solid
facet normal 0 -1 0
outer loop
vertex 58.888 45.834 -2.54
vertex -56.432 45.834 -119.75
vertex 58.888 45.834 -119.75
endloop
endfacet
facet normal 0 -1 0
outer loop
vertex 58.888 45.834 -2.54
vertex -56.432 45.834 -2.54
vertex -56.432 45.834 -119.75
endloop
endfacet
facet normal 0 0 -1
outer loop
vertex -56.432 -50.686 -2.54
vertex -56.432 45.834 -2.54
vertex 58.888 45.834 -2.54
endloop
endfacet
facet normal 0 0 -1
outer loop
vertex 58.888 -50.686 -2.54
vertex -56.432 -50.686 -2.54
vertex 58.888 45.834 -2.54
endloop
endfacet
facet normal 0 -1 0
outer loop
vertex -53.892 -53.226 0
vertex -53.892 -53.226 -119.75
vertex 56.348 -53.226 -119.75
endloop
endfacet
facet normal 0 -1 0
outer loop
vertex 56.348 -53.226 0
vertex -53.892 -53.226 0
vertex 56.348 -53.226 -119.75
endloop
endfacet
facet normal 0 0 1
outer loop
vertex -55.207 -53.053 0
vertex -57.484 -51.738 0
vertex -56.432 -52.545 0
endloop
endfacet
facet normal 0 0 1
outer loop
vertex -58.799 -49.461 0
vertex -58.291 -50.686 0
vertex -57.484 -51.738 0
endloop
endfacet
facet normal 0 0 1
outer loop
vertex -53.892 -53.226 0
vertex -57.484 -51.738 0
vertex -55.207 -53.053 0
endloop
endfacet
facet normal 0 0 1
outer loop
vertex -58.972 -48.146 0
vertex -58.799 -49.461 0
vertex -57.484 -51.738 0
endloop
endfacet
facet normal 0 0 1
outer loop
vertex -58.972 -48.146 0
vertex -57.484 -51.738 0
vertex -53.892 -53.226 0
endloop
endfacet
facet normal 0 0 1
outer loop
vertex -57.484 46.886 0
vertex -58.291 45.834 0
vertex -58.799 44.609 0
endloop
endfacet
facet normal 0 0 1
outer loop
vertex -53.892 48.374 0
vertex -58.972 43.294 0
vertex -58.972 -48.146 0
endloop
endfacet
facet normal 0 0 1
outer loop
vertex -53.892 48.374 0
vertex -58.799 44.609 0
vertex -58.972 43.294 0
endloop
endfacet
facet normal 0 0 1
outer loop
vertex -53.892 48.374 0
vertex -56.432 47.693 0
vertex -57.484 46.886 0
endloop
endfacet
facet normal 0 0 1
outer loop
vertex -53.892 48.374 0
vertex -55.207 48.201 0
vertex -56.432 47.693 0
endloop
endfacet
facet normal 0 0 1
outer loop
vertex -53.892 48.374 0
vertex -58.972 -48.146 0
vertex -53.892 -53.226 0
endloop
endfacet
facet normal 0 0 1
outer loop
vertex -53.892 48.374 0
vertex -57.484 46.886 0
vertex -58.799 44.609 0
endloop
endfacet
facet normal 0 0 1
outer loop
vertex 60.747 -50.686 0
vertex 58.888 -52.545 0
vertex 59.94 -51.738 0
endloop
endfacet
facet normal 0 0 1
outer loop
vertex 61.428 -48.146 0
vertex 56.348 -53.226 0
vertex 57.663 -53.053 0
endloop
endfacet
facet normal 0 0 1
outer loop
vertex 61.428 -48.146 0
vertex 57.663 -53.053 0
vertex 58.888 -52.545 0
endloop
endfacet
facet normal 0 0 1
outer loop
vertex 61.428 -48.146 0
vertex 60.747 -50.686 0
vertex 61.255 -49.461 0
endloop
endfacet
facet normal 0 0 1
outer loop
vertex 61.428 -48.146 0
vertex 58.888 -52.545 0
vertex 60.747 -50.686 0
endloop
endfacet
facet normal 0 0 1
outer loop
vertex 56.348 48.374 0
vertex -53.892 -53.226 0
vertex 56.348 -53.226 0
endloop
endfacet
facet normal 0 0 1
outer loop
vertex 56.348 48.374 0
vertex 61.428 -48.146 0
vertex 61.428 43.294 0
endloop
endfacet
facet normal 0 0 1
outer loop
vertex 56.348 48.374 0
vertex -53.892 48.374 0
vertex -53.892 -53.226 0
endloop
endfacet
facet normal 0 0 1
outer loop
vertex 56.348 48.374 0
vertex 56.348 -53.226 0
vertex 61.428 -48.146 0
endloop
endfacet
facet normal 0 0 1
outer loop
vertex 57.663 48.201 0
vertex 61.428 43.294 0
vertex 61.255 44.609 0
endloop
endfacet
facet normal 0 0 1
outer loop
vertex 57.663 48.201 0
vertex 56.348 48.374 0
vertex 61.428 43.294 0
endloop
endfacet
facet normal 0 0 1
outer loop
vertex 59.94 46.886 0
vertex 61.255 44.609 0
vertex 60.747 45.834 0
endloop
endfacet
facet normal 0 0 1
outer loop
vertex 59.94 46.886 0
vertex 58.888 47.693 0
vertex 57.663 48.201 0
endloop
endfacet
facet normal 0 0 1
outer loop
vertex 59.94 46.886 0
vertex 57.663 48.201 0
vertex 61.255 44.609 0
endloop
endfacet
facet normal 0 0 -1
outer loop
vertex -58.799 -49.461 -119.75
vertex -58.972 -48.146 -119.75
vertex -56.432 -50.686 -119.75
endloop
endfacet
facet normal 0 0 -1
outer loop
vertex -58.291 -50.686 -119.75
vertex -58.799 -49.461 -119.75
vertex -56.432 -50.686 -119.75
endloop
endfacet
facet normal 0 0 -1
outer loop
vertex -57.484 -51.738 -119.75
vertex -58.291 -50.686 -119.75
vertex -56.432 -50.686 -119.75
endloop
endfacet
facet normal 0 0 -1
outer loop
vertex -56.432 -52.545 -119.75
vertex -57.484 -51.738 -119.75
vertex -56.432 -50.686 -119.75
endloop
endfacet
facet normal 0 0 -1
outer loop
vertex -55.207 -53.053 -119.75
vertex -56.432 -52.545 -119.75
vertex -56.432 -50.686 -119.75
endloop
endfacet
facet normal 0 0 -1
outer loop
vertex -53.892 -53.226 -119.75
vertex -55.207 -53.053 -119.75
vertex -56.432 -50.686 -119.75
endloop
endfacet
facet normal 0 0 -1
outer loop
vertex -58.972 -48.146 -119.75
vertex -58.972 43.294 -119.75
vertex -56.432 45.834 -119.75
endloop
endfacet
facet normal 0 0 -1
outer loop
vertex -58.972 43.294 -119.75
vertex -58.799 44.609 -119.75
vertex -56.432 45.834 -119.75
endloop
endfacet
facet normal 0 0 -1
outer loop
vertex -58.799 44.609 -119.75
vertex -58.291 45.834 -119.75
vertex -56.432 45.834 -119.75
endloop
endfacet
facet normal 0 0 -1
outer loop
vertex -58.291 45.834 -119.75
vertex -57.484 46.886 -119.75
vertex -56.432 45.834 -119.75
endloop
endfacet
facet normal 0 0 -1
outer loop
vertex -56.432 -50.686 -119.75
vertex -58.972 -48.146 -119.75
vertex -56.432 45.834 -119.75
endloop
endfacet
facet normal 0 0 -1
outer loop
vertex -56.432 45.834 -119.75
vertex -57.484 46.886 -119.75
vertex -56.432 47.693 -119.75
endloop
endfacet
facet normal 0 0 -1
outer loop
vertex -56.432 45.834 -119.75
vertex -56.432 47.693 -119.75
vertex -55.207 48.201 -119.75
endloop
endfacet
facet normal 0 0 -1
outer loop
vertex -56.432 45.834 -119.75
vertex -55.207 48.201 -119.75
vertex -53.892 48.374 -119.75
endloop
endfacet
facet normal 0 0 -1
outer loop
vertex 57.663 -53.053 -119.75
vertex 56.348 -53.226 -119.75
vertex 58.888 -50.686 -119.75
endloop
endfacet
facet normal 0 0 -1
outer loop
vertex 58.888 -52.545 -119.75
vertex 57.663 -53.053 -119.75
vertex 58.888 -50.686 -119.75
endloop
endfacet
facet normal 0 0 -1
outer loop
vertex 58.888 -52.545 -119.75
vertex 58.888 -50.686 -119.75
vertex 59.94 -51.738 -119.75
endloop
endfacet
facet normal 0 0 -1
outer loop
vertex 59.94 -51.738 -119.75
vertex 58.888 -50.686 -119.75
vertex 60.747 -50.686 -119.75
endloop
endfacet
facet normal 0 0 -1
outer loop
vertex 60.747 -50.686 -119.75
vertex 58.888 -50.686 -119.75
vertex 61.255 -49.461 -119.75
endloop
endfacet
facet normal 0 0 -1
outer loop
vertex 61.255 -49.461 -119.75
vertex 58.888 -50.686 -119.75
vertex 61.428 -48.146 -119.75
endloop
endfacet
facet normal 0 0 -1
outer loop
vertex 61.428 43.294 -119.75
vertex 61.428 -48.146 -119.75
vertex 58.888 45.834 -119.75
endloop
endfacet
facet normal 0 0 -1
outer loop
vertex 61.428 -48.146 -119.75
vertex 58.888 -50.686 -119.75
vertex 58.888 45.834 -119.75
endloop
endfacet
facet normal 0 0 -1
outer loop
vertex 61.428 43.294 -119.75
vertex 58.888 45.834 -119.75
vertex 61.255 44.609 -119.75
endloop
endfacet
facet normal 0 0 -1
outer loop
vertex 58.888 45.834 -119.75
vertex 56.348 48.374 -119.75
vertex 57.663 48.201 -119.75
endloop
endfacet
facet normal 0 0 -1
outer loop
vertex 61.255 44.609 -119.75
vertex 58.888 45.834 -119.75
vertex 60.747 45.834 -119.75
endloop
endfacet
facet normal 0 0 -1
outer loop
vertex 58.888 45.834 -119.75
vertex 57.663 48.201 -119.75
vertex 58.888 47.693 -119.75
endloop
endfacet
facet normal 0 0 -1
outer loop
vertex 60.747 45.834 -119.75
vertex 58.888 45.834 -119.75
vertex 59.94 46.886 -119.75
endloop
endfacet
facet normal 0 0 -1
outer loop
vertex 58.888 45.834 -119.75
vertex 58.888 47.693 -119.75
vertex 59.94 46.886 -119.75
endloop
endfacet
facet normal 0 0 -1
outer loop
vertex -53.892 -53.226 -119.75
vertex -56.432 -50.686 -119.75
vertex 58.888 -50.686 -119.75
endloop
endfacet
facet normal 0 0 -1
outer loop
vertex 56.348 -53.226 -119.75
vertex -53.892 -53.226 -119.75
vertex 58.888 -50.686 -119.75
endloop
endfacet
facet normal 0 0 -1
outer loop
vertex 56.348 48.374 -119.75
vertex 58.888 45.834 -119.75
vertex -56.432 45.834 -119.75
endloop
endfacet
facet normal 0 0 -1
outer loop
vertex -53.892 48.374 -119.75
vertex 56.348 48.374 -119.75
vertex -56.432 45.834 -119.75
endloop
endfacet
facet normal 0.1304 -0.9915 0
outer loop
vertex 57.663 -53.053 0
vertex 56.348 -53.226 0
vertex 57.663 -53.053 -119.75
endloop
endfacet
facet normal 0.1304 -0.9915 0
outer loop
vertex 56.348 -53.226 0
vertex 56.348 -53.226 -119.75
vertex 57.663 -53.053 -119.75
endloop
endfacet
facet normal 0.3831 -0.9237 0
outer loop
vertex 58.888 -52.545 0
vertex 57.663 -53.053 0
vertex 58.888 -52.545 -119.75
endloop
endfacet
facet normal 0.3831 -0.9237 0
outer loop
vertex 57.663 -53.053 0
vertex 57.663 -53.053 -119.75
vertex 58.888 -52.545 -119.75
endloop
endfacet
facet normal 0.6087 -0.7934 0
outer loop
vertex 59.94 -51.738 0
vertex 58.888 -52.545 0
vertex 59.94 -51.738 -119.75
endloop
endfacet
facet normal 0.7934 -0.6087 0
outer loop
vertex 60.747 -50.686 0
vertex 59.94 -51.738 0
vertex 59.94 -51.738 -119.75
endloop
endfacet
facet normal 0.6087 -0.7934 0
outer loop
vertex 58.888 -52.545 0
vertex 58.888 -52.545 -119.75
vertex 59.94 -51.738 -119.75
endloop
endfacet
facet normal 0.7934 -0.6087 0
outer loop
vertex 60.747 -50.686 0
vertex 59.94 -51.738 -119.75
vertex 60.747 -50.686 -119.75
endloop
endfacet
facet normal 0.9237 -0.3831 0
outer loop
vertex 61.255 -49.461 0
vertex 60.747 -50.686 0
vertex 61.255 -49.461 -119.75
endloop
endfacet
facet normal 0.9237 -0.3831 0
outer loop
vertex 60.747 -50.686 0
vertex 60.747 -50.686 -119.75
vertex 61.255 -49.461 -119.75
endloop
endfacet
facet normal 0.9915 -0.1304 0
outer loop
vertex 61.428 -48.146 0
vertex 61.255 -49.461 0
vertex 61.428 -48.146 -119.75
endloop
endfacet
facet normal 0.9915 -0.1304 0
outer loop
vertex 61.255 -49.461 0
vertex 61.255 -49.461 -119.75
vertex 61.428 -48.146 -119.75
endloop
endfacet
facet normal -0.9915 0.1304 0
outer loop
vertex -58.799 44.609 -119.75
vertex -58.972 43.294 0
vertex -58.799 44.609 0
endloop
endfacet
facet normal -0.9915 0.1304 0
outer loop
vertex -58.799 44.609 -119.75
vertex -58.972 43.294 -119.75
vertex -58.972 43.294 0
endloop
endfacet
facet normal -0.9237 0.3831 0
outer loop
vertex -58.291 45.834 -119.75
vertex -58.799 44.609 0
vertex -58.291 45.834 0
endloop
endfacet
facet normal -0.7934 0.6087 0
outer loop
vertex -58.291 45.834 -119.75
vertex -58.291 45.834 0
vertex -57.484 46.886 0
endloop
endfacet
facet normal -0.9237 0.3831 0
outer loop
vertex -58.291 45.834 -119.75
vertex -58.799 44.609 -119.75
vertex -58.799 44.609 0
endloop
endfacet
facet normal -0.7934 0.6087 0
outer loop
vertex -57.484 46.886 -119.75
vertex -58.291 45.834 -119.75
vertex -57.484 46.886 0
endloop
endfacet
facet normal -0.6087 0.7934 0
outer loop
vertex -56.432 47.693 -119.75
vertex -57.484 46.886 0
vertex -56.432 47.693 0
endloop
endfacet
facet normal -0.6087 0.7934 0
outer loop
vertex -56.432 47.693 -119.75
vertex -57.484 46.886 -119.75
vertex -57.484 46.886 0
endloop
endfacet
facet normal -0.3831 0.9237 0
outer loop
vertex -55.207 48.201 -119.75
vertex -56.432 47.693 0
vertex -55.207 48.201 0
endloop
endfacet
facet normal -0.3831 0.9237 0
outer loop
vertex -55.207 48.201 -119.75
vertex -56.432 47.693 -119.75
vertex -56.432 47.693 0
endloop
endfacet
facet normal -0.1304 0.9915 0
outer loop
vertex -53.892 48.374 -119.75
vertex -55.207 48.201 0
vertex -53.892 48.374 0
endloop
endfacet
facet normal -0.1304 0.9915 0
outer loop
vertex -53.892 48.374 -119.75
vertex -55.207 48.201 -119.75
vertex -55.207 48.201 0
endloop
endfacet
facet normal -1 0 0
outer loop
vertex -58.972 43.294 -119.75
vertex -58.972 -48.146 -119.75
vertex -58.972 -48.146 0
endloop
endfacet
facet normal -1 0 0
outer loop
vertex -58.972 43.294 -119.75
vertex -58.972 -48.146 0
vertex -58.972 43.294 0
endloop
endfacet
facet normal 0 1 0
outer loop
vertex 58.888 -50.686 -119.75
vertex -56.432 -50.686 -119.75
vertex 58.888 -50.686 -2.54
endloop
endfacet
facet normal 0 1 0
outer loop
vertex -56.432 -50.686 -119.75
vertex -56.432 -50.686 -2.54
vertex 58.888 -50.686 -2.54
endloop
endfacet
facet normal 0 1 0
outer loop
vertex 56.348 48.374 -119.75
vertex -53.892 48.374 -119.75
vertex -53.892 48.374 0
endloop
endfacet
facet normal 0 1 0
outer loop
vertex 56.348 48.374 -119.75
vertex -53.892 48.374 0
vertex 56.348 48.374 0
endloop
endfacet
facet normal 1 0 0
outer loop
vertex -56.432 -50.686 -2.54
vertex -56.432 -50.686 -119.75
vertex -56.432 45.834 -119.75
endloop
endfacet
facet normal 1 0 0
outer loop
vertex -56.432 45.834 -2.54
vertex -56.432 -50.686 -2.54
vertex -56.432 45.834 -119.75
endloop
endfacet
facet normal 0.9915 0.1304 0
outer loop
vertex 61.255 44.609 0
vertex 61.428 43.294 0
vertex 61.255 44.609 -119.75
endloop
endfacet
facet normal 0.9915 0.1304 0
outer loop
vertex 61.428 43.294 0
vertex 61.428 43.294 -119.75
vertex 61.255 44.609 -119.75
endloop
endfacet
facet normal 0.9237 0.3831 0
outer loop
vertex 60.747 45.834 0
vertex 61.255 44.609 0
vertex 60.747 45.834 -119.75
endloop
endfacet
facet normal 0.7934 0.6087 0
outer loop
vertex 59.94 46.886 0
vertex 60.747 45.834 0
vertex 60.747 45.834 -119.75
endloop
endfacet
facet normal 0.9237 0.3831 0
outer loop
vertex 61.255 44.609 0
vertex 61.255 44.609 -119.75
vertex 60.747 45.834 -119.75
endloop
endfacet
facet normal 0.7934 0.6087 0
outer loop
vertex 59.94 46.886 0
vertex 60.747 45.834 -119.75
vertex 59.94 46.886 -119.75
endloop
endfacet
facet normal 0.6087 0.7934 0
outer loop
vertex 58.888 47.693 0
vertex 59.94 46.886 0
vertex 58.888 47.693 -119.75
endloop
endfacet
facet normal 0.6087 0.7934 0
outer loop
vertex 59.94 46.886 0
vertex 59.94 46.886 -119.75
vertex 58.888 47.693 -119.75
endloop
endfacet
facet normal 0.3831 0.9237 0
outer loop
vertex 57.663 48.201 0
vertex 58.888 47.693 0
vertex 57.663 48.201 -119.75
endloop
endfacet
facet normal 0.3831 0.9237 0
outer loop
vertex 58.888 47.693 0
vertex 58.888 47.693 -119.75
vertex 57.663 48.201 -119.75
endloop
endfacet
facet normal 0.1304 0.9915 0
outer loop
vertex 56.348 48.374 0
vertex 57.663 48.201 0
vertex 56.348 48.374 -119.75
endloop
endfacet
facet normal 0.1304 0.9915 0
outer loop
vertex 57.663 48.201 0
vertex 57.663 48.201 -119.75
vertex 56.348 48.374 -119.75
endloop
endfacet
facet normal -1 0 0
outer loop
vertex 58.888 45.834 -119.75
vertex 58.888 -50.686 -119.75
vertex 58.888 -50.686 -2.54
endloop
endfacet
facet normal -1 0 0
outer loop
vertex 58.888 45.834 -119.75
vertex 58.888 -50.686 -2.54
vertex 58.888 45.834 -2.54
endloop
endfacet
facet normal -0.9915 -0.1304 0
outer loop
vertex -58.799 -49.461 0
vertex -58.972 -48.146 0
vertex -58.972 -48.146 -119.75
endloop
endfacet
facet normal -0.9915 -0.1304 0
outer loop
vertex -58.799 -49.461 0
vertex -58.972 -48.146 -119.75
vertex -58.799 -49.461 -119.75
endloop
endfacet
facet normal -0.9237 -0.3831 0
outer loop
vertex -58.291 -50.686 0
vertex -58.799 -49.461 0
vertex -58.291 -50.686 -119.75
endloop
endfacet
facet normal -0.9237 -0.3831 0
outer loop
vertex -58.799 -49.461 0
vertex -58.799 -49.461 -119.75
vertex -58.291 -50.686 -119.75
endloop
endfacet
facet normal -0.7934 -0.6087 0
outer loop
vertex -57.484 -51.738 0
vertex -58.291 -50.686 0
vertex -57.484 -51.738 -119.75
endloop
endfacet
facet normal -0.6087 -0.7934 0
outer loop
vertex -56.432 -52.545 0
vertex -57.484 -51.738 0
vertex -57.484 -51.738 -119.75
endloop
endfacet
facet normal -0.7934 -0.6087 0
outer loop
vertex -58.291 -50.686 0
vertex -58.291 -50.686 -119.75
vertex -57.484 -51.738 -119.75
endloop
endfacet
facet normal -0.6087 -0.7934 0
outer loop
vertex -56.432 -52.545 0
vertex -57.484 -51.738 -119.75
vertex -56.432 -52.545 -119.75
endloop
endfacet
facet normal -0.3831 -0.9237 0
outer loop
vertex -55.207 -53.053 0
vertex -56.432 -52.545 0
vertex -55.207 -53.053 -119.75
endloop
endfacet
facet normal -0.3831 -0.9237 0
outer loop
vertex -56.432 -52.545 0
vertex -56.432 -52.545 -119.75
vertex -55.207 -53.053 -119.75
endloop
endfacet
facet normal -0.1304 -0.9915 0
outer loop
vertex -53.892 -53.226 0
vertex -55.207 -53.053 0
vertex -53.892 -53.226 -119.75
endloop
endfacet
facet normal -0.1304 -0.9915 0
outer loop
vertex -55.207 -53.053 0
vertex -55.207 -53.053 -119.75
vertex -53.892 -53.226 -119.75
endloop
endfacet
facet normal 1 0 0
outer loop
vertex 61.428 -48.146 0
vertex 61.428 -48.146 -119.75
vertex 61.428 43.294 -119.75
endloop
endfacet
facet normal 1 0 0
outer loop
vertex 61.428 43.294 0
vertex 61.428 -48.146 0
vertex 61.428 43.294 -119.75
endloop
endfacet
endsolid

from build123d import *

# Parameters (mm, degrees)
F0_W     = 120.4
F0_H     = 101.6
F1_DEPTH = 119.75
F2_T     = -2.54
F3_R     = 5.08


with BuildPart() as f1:
    # F0 (on Top) → F1 (new body)
    with BuildSketch(Plane.XY):
        with Locations((1.22794, -2.425997)):
            Rectangle(F0_W, F0_H)
    extrude(amount=-F1_DEPTH)

    # F2
    f2_openings = [f1.faces().sort_by_distance(p)[0] for p in [
        (1.22794, -2.425997, -119.75),
    ]]
    offset(amount=F2_T, openings=f2_openings)

    # F3
    f3_edges = [f1.edges().sort_by_distance(p)[0] for p in [
        (61.42794, 48.374003, -59.875),
        (-58.97206, 48.374003, -59.875),
        (-58.97206, -53.225997, -59.875),
        (61.42794, -53.225997, -59.875),
    ]]
    fillet(f3_edges, radius=F3_R)


solid = f1.part
